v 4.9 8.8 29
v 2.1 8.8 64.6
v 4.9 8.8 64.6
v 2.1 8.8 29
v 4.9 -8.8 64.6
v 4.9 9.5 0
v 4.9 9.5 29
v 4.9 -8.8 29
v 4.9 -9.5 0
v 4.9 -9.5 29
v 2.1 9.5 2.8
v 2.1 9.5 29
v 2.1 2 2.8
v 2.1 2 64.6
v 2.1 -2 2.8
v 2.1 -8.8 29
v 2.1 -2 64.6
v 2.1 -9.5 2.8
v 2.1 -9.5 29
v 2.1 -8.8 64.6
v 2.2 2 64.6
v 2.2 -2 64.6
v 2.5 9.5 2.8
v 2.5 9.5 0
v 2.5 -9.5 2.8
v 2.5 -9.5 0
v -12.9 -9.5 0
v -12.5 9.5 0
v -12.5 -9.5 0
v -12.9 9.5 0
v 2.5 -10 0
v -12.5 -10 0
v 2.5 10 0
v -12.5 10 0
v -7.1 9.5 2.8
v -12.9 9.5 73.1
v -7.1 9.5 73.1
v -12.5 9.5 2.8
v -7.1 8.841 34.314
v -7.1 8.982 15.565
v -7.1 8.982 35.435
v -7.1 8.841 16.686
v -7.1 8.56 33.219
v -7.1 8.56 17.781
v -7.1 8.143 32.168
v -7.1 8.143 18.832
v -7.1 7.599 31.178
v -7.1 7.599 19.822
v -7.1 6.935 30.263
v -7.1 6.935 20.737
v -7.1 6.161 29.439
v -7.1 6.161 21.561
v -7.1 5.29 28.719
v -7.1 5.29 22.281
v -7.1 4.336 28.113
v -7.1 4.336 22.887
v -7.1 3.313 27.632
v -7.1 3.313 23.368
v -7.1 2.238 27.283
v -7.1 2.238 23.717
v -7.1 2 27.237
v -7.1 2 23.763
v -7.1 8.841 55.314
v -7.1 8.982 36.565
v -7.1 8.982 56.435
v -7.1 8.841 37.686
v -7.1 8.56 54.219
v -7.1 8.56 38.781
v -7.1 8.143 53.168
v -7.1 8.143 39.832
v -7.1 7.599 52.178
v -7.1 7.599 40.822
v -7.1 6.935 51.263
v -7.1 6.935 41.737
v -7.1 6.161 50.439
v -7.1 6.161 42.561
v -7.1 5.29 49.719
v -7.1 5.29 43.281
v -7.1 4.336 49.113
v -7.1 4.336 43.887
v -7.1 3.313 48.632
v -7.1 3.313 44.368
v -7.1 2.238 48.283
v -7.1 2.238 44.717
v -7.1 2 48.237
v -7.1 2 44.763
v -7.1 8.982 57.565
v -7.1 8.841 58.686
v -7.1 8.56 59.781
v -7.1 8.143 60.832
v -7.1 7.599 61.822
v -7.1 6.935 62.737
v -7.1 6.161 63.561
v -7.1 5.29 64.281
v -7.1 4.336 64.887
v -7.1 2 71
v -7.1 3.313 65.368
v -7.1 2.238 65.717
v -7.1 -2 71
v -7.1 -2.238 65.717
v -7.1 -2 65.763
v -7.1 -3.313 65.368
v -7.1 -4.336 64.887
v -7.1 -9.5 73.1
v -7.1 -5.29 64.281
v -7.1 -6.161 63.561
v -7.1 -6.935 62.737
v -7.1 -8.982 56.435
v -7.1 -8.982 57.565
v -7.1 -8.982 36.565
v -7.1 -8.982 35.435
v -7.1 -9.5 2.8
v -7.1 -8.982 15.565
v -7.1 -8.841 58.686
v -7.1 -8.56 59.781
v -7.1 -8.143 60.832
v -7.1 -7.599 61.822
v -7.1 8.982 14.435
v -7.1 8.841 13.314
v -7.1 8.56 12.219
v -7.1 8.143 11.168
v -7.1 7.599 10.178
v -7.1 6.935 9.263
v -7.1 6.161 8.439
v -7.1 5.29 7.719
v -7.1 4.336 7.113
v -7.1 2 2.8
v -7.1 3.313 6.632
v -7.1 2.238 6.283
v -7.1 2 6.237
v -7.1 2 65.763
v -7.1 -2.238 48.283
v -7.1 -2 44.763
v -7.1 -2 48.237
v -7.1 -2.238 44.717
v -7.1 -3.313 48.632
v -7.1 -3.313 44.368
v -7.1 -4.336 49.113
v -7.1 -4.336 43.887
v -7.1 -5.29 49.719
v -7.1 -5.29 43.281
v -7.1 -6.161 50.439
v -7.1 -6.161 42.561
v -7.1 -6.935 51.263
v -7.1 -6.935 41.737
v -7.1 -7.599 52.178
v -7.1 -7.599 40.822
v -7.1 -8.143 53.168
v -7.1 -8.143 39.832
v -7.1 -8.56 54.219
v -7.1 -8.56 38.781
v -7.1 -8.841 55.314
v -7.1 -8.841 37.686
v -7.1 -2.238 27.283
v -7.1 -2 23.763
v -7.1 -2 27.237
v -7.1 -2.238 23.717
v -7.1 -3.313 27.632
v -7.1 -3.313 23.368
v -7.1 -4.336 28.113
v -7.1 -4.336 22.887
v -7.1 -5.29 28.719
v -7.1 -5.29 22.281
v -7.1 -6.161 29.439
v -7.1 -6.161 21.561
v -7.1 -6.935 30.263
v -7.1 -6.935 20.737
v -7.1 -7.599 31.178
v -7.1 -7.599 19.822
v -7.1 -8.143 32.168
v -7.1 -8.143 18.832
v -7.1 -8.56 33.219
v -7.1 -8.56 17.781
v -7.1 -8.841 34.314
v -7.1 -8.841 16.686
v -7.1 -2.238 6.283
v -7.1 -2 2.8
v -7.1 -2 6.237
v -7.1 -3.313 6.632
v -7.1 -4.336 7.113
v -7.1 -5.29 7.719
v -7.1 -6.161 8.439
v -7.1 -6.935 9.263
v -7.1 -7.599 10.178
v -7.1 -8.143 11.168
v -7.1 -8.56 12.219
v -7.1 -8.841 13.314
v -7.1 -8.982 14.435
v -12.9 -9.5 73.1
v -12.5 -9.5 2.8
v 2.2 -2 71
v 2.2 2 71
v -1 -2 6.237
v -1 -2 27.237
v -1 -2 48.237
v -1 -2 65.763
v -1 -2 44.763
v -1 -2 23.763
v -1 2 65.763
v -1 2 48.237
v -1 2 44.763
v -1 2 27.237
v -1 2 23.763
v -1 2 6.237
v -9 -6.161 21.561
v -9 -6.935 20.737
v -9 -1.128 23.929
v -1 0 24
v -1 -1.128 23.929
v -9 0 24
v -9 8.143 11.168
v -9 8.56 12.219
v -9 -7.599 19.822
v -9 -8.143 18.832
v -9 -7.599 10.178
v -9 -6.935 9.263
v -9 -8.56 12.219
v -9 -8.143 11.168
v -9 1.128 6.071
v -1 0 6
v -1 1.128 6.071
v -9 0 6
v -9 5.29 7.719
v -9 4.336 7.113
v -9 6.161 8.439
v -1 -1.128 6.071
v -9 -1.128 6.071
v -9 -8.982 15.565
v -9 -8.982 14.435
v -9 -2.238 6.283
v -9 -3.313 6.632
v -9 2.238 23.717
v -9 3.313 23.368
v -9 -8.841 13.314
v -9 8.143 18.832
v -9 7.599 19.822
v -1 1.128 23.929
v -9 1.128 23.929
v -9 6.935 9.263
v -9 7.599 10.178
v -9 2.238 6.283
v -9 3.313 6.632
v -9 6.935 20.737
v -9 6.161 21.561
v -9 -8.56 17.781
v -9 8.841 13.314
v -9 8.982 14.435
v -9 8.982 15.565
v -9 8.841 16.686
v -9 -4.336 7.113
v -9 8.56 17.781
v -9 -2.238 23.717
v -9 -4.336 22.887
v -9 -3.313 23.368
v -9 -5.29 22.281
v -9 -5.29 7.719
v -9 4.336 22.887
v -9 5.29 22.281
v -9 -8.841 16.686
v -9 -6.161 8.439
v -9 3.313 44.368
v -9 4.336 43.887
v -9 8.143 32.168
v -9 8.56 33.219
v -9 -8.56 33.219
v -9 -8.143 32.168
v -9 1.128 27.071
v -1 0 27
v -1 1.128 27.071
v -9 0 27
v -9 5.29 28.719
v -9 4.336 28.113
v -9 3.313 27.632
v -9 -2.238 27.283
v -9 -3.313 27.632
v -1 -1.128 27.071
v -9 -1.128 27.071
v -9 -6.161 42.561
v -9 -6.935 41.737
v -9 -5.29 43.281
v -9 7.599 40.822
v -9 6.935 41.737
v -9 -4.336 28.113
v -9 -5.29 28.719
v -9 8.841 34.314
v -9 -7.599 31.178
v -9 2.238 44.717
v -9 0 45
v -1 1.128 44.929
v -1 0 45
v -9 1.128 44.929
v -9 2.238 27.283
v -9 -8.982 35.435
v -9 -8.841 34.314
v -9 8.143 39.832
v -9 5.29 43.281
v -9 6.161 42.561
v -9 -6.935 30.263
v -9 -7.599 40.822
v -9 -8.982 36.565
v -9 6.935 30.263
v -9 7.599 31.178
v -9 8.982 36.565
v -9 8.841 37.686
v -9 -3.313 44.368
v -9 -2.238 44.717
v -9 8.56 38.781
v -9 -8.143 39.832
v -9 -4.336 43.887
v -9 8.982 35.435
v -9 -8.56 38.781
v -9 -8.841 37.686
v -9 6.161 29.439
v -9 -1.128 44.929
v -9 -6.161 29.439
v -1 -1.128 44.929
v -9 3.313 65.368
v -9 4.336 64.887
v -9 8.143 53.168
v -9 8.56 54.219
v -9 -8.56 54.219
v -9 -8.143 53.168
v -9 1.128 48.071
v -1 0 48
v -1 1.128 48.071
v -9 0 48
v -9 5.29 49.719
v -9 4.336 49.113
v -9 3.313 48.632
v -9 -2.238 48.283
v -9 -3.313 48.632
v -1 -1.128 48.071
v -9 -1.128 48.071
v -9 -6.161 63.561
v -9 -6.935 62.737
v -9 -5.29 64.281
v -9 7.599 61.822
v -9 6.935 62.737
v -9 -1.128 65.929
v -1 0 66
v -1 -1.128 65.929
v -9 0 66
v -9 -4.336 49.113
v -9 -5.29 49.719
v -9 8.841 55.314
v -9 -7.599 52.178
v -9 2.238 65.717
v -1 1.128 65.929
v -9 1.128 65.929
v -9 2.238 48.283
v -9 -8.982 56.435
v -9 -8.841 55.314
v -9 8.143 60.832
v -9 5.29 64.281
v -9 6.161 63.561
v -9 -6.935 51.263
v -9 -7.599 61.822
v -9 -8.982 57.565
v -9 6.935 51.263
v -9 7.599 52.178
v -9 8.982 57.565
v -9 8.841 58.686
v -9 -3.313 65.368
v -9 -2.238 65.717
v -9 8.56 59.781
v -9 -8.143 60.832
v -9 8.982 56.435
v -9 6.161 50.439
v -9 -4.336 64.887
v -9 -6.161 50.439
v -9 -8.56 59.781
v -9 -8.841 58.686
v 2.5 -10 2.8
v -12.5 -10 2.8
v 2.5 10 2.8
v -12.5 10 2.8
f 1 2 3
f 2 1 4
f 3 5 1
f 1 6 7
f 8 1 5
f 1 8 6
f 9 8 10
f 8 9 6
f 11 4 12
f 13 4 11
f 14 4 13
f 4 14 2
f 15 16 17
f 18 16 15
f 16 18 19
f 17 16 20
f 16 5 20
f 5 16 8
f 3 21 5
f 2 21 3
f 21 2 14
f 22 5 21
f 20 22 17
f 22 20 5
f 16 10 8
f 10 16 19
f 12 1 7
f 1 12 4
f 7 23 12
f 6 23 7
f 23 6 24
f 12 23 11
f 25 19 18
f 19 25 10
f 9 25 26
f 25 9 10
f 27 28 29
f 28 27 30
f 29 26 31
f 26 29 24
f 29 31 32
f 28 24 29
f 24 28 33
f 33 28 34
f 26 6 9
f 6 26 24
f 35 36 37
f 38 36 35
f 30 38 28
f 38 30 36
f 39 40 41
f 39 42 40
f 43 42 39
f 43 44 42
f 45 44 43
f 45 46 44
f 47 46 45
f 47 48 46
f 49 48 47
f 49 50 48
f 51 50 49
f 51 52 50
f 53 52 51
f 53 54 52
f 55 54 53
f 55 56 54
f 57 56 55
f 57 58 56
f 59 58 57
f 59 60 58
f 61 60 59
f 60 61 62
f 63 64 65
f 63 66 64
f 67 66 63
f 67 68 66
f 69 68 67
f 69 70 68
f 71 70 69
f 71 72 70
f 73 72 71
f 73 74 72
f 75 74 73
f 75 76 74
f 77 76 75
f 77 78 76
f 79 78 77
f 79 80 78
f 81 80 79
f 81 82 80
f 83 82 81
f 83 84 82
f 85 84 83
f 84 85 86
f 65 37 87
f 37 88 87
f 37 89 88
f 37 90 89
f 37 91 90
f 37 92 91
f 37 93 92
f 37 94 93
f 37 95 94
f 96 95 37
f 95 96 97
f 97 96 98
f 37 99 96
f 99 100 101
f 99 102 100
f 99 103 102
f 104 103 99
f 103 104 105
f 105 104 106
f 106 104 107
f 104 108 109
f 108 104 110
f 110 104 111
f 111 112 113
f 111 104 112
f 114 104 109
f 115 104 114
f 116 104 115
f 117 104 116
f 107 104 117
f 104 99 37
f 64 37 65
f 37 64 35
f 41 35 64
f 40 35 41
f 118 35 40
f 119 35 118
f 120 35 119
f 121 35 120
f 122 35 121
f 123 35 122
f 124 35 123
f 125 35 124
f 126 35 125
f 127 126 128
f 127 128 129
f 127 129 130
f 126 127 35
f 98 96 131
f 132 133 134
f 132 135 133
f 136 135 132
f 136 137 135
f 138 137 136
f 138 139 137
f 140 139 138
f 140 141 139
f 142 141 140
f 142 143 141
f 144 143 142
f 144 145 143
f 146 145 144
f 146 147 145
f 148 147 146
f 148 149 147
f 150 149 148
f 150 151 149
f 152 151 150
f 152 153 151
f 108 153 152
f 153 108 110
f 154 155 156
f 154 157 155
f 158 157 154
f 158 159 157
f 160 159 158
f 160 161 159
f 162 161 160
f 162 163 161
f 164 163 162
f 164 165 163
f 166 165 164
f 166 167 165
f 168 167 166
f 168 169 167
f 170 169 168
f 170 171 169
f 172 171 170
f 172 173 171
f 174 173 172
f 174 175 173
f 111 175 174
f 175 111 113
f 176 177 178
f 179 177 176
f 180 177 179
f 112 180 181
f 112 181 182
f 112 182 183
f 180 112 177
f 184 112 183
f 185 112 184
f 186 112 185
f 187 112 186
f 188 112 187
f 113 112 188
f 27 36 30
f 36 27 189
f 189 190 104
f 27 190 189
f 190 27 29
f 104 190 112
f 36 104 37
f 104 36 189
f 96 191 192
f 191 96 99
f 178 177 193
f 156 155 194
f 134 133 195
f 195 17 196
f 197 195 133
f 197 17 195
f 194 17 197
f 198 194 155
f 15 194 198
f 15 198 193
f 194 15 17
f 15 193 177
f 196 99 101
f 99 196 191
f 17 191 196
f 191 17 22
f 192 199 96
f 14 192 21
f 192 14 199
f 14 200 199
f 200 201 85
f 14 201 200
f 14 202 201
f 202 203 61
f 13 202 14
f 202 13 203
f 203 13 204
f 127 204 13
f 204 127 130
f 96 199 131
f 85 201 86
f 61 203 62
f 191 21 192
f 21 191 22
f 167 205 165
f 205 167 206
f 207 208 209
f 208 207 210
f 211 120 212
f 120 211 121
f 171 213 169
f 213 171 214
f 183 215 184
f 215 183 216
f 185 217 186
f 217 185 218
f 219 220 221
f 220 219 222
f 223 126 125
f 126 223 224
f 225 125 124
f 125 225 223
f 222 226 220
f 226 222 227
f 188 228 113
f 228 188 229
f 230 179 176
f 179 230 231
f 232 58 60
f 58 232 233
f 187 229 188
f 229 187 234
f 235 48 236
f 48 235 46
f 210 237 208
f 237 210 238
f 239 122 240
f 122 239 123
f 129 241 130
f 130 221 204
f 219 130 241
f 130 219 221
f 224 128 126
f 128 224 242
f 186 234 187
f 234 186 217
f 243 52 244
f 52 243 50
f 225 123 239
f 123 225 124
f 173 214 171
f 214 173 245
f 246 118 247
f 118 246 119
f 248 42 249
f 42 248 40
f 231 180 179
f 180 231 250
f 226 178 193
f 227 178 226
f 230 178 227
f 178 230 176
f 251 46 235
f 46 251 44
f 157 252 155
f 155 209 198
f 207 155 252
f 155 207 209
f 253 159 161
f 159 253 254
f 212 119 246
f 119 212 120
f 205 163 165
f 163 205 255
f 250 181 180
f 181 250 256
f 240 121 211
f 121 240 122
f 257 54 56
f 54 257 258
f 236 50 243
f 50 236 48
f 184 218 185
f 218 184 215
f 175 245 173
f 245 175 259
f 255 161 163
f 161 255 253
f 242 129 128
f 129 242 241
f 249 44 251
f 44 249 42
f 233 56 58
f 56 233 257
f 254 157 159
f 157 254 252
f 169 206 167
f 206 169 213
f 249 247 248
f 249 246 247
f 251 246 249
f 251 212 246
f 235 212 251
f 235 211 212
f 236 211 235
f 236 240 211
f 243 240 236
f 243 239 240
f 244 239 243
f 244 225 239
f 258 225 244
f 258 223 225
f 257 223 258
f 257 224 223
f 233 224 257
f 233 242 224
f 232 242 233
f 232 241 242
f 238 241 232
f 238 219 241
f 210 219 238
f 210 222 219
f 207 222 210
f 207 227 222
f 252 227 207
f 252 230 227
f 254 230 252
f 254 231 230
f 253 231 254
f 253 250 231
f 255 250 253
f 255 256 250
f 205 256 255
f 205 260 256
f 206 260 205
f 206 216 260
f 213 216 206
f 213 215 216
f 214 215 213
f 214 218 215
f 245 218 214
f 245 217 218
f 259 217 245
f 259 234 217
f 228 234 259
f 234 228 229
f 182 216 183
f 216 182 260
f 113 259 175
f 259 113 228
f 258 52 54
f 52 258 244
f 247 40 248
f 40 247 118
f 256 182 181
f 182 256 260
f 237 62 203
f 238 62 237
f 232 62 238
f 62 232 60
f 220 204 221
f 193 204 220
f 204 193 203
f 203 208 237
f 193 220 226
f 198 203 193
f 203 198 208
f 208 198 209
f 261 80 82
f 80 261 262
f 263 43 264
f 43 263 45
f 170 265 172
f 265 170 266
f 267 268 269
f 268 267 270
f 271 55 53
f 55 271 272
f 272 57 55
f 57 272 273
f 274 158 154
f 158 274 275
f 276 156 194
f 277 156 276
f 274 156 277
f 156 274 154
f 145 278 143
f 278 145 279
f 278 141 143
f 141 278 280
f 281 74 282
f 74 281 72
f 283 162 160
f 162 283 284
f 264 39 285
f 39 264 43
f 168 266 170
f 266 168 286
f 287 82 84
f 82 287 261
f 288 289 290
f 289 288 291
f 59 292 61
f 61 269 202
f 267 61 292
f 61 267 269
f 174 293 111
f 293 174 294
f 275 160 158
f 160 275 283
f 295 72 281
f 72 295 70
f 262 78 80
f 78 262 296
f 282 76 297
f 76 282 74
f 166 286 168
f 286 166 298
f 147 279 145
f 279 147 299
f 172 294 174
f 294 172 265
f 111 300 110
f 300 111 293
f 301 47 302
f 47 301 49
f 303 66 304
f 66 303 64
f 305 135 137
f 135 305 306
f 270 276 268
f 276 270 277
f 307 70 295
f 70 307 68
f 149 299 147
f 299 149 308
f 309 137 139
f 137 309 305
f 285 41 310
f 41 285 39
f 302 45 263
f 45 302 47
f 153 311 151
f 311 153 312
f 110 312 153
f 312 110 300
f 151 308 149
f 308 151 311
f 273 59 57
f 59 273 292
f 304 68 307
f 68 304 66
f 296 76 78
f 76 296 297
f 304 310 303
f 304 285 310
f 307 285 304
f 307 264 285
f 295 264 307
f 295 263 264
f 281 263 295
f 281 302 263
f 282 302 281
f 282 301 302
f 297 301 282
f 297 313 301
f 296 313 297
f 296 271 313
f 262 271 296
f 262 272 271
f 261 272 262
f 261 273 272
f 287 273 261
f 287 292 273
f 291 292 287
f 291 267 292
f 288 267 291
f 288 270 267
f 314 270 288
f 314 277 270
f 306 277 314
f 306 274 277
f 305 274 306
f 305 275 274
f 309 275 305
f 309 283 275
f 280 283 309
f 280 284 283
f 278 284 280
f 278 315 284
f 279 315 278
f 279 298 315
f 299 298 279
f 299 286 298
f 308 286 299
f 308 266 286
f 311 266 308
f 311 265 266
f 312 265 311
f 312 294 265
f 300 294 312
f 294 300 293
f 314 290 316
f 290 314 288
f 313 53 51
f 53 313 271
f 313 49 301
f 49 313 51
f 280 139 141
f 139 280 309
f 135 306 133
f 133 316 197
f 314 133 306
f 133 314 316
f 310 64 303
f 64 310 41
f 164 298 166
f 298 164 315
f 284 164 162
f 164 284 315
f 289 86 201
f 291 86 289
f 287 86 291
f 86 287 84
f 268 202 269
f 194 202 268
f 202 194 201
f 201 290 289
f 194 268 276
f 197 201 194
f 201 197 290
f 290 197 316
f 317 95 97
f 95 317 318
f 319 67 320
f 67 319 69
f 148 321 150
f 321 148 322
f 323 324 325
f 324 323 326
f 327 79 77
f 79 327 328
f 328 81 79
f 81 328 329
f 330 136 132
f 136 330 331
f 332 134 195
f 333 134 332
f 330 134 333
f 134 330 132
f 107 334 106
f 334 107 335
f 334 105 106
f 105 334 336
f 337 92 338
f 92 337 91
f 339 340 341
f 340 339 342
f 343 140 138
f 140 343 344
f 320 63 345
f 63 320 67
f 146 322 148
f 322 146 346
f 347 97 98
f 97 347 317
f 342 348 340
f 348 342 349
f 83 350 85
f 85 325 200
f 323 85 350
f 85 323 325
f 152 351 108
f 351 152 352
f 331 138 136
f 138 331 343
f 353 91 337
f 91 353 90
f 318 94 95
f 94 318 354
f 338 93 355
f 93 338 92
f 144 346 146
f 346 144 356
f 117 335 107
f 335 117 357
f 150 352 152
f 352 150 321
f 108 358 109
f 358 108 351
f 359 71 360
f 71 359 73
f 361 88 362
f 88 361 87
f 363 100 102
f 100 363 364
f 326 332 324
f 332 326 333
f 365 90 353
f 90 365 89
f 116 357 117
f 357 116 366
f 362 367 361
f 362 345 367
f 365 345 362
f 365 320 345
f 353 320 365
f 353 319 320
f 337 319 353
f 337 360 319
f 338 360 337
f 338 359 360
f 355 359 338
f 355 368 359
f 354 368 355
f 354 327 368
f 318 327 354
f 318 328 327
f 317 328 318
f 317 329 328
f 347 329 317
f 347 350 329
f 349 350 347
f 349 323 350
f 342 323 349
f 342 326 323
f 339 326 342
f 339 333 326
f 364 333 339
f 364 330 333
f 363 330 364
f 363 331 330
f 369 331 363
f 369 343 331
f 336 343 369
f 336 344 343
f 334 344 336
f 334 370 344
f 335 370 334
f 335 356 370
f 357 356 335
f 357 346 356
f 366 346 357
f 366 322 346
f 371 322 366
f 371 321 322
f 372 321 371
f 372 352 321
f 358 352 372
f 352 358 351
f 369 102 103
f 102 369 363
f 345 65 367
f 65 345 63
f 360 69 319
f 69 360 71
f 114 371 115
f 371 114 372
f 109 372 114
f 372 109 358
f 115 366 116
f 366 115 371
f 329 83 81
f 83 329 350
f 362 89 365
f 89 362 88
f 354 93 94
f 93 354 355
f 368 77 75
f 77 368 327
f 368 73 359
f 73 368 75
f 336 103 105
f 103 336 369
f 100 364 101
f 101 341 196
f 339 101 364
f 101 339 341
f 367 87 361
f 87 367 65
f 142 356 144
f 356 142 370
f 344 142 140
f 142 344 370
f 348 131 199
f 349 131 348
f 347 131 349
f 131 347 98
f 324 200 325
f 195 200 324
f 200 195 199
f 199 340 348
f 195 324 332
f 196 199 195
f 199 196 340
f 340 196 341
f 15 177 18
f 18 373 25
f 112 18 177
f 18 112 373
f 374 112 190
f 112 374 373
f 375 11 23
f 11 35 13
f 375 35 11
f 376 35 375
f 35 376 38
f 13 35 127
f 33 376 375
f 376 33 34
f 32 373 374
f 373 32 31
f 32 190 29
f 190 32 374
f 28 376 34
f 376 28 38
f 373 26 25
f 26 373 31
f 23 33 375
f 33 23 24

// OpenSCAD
/*

*/
//magnet_bed();
drzak_A();

module magnet_bed(dia=18){
    
    diff=3;
    
    color ("Blue") translate([0,0,0]) rotate ([0,90,0]) cylinder(h=8, d=18, center=true, $fn=50);
    color ("Blue") translate([0,0,dia+diff]) rotate ([0,90,0]) cylinder(h=8, d=18, center=true, $fn=50);
    color ("Blue") translate([0,0,2*(dia+diff)]) rotate ([0,90,0]) cylinder(h=8, d=18, center=true, $fn=50);
}//

module uchyt_repra(delka_rovneho_segmentu=20, delka_sikmeho_segmentu=37,sirka=25,tloustka=2.8){
    //delka_rovneho_segmentu=20;
    //delka_sikmeho_segmentu=37;
    //sirka=25;
    //tloustka=2.8;
    // -4 u promenne sirka je tam pro zuzeni, aby to nebylo sirsi nez zakladna
    
    translate([0,0,-0.5*(-delka_rovneho_segmentu+delka_sikmeho_segmentu)]){
        //color ("Lightgreen")translate ([0,(-6-1+sirka)/2,delka_sikmeho_segmentu-tloustka/2]) rotate ([90,0,0]) cylinder(h=sirka-4-3, r=tloustka/2, $fn=50);
        
        //color ("Lightgreen")translate ([0,(-6-1+sirka)/2,-delka_rovneho_segmentu]) rotate ([0,0,90]) cylinder(h=-tloustka/2+delka_sikmeho_segmentu+delka_rovneho_segmentu, r=tloustka/2, $fn=50);
        //color ("Lightgreen")translate ([0,-(-6-1+sirka)/2,0-delka_rovneho_segmentu]) rotate ([0,0,90]) cylinder(h=-tloustka/2+delka_sikmeho_segmentu+delka_rovneho_segmentu, r=tloustka/2, $fn=50);
        
        //color ("Green")translate ([0,(-6-1+sirka)/2,delka_sikmeho_segmentu-tloustka/2]) sphere(r=1*tloustka/2, $fn=50);
        //color ("Green")translate ([0,-(-6-1+sirka)/2,delka_sikmeho_segmentu-tloustka/2]) sphere(r=1*tloustka/2, $fn=50);
        
        //color ("Khaki")translate ([1,0,0]) rotate ([0,0,0]) cylinder(h=0.95*delka_sikmeho_segmentu, r1=1.5, r2=1.0, $fn=50);
        color ("Yellow")translate ([0,0,(-0.5*tloustka+delka_sikmeho_segmentu)*0.5]) rotate ([90,0,90]) cube([sirka-6-tloustka/2,delka_sikmeho_segmentu-tloustka/2,tloustka], center=true);    
        color ("Gold")translate ([0,0,-0.5*delka_rovneho_segmentu]) rotate ([90,0,90]) cube([sirka-6/*+3*/,delka_rovneho_segmentu,tloustka], center=true);
    }//center translate
    
}//module

module uchyt_tabule(delka_rovneho_segmentu=20, delka_sikmeho_segmentu=37,sirka=25,tloustka=2.8){
    //delka_rovneho_segmentu=20;
    //delka_sikmeho_segmentu=37;
    //sirka=25;
    //tloustka=2.8;
    // -4 u promenne sirka je tam pro zuzeni, aby to nebylo sirsi nez zakladna
    
    
    
    
    translate([0,0,-0.5*(-delka_rovneho_segmentu+delka_sikmeho_segmentu)]){
        //color ("Lightgreen")translate ([0,(-6-1+sirka)/2,delka_sikmeho_segmentu-tloustka/2]) rotate ([90,0,0]) cylinder(h=sirka-4-3, r=tloustka/2, $fn=50);
        
        //color ("Lightgreen")translate ([0,(-6-1+sirka)/2,-delka_rovneho_segmentu]) rotate ([0,0,90]) cylinder(h=-tloustka/2+delka_sikmeho_segmentu+delka_rovneho_segmentu, r=tloustka/2, $fn=50);
        //color ("Lightgreen")translate ([0,-(-6-1+sirka)/2,0-delka_rovneho_segmentu]) rotate ([0,0,90]) cylinder(h=-tloustka/2+delka_sikmeho_segmentu+delka_rovneho_segmentu, r=tloustka/2, $fn=50);
        
        //color ("Green")translate ([0,(-6-1+sirka)/2,delka_sikmeho_segmentu-tloustka/2]) sphere(r=1*tloustka/2, $fn=50);
        //color ("Green")translate ([0,-(-6-1+sirka)/2,delka_sikmeho_segmentu-tloustka/2]) sphere(r=1*tloustka/2, $fn=50);
        
        //color ("Khaki")translate ([1,0,0]) rotate ([0,0,0]) cylinder(h=0.95*delka_sikmeho_segmentu, r1=1.5, r2=1.0, $fn=50);
        color ("Yellow")translate ([0,0,(-0.5*tloustka+delka_sikmeho_segmentu)*0.5]) rotate ([90,0,90]) cube([sirka-6 /*-tloustka/2*/,delka_sikmeho_segmentu-tloustka/2,tloustka], center=true);    
        color ("Gold")translate ([0,0,-0.5*delka_rovneho_segmentu]) rotate ([90,0,90]) cube([sirka-6/*+3*/,delka_rovneho_segmentu,tloustka], center=true);
    }//center translate
    
}//module

module drzak_A(){
    
    uchyt_delka_rovneho_segmentu=29;
    uchyt_delka_sikmeho_segmentu=37;
    uchyt_sirka=25;
    uchyt_tloustka=2.8;

    //podpera
/*
difference(){*/
    
    /*color("grey")  translate([0,0,-8-0.5*uchyt_tloustka]) rotate([0,0,0]) cube([60,40,23], center=true);
    }*/
    
    //to co se bude lepit ke stolu
    translate([-5,0,uchyt_tloustka*0.5]) rotate([0,0,90]) cube([/*uchyt_sirka*/ 20 ,15,uchyt_tloustka], center=true);
    
    //samotna uchytka
    translate([3.5,0,0.5*uchyt_delka_rovneho_segmentu+0.5*uchyt_delka_sikmeho_segmentu])
        uchyt_repra(delka_rovneho_segmentu=uchyt_delka_rovneho_segmentu,
        delka_sikmeho_segmentu=uchyt_delka_sikmeho_segmentu,
        sirka=uchyt_sirka,
        tloustka=uchyt_tloustka);

 
    //kus pro magnet
    difference(){
    prodlouzeni=10;
        union(){
            color ("green") translate([-02.8,0,36]) rotate([90,90,0]) cube([70,10,4], center=true);
            translate([-10,0,0.5*prodlouzeni+0.5*uchyt_delka_rovneho_segmentu+0.5*uchyt_delka_sikmeho_segmentu])
            uchyt_tabule(delka_rovneho_segmentu=prodlouzeni+uchyt_delka_rovneho_segmentu,delka_sikmeho_segmentu=uchyt_delka_sikmeho_segmentu,sirka=uchyt_sirka,tloustka=3+uchyt_tloustka);
            }//union
    translate([-5,0,15]) magnet_bed();
    }//diff
//translate([-9,0,30]) magnet_bed();
        
    //infotexty
    //color("black") rotate([0,0,0]) translate([2,3,uchyt_tloustka]) linear_extrude(1) text(text=str("DES.VER.4"), size=5);
    //color("black") rotate([0,0,0]) translate([2,-8,uchyt_tloustka]) linear_extrude(1) text(text=str("CEILING -->"), size=5);
    }//module




module drzak_B(){ }//mod
